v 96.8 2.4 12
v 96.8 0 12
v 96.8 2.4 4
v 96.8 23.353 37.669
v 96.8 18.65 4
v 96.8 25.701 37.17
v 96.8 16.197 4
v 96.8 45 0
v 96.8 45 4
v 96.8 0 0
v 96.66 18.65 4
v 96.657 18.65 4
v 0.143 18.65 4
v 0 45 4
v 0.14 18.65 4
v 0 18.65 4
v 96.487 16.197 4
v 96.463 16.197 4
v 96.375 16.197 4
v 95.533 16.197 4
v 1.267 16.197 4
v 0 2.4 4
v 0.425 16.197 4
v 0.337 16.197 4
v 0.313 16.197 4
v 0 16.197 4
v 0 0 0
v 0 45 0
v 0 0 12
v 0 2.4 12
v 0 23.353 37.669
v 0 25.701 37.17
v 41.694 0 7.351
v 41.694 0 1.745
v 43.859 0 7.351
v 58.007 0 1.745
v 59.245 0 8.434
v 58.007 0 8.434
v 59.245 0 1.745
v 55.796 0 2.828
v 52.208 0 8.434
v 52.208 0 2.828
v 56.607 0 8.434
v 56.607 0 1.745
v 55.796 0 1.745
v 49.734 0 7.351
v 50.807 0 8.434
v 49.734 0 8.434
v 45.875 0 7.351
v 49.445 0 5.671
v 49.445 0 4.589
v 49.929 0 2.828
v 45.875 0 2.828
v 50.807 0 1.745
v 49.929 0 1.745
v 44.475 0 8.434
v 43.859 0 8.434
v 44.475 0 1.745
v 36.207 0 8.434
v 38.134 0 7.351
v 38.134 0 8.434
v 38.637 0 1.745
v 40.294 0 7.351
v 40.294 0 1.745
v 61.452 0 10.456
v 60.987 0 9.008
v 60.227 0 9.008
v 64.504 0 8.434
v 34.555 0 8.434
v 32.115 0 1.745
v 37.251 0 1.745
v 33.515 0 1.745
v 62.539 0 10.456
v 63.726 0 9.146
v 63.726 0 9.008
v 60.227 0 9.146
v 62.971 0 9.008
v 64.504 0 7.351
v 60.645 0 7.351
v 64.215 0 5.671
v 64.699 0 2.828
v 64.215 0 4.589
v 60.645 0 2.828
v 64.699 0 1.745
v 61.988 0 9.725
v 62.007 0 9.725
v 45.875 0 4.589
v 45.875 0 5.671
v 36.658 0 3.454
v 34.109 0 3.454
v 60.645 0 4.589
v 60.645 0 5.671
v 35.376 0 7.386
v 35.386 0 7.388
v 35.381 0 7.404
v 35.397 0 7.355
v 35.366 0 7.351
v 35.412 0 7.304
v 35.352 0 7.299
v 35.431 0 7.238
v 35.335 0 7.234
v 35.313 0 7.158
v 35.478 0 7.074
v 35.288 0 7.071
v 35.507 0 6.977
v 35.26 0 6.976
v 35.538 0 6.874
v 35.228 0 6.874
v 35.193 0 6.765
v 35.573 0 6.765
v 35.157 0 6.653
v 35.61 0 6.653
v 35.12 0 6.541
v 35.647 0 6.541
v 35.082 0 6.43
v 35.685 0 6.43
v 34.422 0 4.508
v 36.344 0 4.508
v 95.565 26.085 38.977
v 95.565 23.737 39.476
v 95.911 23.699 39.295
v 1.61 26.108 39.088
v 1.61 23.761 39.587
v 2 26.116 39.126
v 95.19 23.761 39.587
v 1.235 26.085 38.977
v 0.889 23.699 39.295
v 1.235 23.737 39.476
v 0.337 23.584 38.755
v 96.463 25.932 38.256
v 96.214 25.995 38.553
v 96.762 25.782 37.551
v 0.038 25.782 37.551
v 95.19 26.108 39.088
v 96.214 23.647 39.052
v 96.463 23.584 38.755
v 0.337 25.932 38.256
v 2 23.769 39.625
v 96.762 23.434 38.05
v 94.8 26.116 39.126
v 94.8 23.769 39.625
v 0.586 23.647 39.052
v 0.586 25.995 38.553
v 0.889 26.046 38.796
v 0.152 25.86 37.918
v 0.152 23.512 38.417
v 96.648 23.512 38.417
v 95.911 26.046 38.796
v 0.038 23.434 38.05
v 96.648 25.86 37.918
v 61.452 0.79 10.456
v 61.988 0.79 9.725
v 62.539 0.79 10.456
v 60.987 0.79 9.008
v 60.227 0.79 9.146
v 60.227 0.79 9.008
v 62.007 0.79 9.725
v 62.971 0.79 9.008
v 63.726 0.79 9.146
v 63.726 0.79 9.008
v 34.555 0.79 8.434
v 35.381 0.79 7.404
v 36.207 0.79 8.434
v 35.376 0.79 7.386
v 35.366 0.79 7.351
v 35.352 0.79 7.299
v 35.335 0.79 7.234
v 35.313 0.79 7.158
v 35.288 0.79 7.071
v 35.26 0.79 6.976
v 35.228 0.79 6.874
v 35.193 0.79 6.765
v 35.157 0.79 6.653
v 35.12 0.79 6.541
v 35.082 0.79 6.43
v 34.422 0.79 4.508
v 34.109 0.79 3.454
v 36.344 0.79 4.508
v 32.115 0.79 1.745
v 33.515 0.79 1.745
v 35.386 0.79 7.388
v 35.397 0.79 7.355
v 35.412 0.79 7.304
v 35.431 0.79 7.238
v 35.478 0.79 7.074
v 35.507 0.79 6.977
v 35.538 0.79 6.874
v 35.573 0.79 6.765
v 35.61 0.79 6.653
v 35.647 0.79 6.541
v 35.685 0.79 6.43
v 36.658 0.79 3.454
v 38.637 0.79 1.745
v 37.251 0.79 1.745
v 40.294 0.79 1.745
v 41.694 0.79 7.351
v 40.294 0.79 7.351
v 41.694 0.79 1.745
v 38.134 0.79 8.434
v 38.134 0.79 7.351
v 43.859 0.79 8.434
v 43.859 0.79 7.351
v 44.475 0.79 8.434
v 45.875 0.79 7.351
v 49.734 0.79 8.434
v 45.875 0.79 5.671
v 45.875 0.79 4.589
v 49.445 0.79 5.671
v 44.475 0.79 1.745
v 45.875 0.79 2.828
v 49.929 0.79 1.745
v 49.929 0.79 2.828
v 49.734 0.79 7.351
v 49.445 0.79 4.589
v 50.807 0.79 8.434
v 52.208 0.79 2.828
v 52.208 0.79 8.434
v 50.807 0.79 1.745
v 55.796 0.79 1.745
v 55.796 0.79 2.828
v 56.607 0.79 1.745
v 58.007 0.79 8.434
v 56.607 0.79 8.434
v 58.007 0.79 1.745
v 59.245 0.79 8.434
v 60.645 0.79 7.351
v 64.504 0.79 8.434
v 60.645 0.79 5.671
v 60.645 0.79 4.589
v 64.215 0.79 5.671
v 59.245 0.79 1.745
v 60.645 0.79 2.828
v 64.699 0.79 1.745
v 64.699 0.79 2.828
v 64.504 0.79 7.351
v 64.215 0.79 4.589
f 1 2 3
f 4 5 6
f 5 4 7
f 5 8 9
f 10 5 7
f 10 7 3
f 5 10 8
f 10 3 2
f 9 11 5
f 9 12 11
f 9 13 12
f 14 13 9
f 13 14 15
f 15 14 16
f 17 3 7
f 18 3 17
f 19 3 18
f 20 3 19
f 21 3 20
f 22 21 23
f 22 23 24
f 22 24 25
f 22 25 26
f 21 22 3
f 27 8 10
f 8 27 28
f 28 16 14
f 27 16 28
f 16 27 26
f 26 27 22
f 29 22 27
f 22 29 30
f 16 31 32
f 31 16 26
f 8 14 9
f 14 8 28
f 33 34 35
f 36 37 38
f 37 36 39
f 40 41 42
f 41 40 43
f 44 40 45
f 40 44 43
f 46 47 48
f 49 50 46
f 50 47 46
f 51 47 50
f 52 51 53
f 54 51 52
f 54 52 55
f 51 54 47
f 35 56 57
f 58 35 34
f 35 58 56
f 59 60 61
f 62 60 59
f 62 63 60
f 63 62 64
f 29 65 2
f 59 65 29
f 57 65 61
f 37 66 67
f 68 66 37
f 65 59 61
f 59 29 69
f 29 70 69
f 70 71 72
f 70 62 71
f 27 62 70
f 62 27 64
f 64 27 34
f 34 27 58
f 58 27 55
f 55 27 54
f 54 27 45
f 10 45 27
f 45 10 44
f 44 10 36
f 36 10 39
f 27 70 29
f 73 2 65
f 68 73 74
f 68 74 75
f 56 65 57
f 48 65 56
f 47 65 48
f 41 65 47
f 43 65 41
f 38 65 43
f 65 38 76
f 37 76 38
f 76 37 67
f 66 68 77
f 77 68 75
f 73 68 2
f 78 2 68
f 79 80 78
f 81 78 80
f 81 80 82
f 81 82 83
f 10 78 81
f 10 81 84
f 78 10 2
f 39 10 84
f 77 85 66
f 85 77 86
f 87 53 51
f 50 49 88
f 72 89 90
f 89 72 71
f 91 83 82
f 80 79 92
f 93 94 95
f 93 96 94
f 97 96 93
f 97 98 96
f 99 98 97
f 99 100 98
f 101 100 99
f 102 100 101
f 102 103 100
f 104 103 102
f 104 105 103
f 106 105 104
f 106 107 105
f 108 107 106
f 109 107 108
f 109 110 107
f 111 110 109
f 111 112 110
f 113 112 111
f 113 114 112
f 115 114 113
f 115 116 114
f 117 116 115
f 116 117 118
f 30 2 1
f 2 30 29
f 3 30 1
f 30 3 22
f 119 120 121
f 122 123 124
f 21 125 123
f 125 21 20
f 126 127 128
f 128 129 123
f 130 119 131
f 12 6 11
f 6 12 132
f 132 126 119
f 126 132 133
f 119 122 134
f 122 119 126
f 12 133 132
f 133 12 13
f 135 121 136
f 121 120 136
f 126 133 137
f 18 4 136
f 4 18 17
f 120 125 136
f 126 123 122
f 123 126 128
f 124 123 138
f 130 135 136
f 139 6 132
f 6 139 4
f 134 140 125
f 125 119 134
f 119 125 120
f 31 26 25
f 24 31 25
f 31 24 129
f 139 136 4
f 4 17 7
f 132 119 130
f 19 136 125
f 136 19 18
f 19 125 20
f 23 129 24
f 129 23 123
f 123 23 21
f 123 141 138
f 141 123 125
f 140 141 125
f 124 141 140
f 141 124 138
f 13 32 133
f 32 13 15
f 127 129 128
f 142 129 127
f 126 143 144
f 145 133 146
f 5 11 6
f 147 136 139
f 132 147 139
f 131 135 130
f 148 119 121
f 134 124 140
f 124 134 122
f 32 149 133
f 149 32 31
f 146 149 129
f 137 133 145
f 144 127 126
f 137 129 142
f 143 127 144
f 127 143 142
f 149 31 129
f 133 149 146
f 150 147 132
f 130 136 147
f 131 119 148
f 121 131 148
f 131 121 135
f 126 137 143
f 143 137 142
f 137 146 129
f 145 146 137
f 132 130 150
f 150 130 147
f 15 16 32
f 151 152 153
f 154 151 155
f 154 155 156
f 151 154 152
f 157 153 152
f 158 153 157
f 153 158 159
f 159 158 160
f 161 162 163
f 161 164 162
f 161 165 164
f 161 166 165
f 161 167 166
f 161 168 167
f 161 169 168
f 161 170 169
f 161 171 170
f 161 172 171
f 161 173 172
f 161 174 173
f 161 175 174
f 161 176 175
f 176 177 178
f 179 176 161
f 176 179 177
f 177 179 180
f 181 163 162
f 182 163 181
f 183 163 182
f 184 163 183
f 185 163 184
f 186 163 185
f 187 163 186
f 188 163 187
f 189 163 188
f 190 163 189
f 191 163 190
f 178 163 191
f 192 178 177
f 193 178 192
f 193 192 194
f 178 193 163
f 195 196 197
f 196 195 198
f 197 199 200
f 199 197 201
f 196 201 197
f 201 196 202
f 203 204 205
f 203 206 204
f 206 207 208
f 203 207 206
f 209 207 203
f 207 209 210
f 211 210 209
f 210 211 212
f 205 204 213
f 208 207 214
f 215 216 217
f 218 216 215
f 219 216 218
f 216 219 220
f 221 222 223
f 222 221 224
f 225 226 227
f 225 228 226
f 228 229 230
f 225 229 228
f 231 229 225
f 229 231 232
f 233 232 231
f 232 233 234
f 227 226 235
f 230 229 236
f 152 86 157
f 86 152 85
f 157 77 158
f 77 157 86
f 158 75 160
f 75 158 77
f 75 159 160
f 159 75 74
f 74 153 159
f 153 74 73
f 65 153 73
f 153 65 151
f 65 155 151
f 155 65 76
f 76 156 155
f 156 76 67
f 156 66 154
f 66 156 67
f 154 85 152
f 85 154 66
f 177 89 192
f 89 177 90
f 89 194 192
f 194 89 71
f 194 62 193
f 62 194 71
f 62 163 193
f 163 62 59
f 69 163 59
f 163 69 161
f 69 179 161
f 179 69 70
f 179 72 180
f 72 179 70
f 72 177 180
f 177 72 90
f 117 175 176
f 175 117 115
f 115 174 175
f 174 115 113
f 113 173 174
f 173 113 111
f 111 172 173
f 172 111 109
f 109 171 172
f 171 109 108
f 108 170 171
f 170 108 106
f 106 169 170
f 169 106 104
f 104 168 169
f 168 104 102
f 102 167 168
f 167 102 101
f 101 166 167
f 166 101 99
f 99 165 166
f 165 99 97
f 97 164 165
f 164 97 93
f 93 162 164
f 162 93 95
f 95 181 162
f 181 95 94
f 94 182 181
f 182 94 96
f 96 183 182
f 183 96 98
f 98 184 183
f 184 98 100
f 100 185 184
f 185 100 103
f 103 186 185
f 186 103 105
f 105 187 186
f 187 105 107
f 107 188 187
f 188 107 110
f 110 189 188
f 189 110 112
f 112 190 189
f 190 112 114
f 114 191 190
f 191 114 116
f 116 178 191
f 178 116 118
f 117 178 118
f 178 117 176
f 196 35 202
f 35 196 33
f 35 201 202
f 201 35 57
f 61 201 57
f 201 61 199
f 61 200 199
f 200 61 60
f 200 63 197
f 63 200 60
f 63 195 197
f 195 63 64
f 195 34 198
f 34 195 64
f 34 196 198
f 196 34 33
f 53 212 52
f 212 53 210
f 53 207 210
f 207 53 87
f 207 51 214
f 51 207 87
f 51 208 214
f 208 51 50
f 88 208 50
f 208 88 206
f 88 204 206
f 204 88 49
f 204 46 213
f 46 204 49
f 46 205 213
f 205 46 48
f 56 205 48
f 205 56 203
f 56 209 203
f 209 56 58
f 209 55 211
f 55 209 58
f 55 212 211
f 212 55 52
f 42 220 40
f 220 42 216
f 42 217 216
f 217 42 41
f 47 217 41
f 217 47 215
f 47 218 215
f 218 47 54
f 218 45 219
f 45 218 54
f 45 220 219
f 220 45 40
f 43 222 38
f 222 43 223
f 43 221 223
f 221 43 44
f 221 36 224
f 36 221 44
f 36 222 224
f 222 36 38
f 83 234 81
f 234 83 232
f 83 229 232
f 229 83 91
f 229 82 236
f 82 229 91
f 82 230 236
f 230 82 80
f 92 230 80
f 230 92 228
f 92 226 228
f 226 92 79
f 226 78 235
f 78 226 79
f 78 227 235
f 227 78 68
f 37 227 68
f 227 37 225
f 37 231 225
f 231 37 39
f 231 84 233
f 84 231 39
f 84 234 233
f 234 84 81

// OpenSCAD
// Porta-cartão de mesa - impressão 3D
card_w = 90;         // largura do cartão (mm)
card_h = 50;         // altura do cartão (mm)
stack = 12;          // espessura da pilha de cartões (mm)
wall = 2.4;          // espessura das paredes (mm)
clearance = 1;       // folga para os cartões (mm)
tilt = 12;           // inclinação do encosto (graus)
base_d = 45;         // profundidade da base (mm)
base_h = 4;          // altura da base (mm)
lip_h = 12;          // altura da aba da frente (mm)
back_h = 40;         // altura do encosto (mm)
word = "ATELIÊ";     // texto gravado
font_size = 7;       // altura da letra (mm)
engrave = 0.8;       // profundidade da gravação (mm)

body_w = card_w + 2 * clearance + 2 * wall;
pocket = stack + clearance;

plate_fn = 32;       // número de segmentos dos cantos arredondados do encosto

// Placa com os 4 cantos da face (plano XZ) arredondados
// size = [largura, espessura, altura], r = raio dos cantos
module rounded_plate(size, r) {
    hull() {
        for (x = [r, size[0] - r], z = [r, size[2] - r])
            translate([x, 0, z])
                rotate([-90, 0, 0])
                    cylinder(h = size[1], r = r, $fn = plate_fn);
    }
}


difference() {
    union() {
        cube([body_w, base_d, base_h]);
        cube([body_w, wall, lip_h]);
        translate([0, wall + pocket + wall, 0])
            rotate([-tilt, 0, 0])
                translate([0, -wall, 0])
                    rounded_plate([body_w, wall, back_h], 2);
    }
    translate([body_w / 2, -0.01, lip_h / 2])
        rotate([90, 0, 0])
            translate([0, 0, -engrave])
                linear_extrude(engrave + 0.01)
                    text(word, size = font_size, font = "Liberation Sans:style=Bold",
                         halign = "center", valign = "center");
}

echo(str("Largura: ", body_w, " mm"));
echo(str("Profundidade: ", base_d, " mm"));
echo(str("Altura: ", back_h * cos(tilt), " mm"));
